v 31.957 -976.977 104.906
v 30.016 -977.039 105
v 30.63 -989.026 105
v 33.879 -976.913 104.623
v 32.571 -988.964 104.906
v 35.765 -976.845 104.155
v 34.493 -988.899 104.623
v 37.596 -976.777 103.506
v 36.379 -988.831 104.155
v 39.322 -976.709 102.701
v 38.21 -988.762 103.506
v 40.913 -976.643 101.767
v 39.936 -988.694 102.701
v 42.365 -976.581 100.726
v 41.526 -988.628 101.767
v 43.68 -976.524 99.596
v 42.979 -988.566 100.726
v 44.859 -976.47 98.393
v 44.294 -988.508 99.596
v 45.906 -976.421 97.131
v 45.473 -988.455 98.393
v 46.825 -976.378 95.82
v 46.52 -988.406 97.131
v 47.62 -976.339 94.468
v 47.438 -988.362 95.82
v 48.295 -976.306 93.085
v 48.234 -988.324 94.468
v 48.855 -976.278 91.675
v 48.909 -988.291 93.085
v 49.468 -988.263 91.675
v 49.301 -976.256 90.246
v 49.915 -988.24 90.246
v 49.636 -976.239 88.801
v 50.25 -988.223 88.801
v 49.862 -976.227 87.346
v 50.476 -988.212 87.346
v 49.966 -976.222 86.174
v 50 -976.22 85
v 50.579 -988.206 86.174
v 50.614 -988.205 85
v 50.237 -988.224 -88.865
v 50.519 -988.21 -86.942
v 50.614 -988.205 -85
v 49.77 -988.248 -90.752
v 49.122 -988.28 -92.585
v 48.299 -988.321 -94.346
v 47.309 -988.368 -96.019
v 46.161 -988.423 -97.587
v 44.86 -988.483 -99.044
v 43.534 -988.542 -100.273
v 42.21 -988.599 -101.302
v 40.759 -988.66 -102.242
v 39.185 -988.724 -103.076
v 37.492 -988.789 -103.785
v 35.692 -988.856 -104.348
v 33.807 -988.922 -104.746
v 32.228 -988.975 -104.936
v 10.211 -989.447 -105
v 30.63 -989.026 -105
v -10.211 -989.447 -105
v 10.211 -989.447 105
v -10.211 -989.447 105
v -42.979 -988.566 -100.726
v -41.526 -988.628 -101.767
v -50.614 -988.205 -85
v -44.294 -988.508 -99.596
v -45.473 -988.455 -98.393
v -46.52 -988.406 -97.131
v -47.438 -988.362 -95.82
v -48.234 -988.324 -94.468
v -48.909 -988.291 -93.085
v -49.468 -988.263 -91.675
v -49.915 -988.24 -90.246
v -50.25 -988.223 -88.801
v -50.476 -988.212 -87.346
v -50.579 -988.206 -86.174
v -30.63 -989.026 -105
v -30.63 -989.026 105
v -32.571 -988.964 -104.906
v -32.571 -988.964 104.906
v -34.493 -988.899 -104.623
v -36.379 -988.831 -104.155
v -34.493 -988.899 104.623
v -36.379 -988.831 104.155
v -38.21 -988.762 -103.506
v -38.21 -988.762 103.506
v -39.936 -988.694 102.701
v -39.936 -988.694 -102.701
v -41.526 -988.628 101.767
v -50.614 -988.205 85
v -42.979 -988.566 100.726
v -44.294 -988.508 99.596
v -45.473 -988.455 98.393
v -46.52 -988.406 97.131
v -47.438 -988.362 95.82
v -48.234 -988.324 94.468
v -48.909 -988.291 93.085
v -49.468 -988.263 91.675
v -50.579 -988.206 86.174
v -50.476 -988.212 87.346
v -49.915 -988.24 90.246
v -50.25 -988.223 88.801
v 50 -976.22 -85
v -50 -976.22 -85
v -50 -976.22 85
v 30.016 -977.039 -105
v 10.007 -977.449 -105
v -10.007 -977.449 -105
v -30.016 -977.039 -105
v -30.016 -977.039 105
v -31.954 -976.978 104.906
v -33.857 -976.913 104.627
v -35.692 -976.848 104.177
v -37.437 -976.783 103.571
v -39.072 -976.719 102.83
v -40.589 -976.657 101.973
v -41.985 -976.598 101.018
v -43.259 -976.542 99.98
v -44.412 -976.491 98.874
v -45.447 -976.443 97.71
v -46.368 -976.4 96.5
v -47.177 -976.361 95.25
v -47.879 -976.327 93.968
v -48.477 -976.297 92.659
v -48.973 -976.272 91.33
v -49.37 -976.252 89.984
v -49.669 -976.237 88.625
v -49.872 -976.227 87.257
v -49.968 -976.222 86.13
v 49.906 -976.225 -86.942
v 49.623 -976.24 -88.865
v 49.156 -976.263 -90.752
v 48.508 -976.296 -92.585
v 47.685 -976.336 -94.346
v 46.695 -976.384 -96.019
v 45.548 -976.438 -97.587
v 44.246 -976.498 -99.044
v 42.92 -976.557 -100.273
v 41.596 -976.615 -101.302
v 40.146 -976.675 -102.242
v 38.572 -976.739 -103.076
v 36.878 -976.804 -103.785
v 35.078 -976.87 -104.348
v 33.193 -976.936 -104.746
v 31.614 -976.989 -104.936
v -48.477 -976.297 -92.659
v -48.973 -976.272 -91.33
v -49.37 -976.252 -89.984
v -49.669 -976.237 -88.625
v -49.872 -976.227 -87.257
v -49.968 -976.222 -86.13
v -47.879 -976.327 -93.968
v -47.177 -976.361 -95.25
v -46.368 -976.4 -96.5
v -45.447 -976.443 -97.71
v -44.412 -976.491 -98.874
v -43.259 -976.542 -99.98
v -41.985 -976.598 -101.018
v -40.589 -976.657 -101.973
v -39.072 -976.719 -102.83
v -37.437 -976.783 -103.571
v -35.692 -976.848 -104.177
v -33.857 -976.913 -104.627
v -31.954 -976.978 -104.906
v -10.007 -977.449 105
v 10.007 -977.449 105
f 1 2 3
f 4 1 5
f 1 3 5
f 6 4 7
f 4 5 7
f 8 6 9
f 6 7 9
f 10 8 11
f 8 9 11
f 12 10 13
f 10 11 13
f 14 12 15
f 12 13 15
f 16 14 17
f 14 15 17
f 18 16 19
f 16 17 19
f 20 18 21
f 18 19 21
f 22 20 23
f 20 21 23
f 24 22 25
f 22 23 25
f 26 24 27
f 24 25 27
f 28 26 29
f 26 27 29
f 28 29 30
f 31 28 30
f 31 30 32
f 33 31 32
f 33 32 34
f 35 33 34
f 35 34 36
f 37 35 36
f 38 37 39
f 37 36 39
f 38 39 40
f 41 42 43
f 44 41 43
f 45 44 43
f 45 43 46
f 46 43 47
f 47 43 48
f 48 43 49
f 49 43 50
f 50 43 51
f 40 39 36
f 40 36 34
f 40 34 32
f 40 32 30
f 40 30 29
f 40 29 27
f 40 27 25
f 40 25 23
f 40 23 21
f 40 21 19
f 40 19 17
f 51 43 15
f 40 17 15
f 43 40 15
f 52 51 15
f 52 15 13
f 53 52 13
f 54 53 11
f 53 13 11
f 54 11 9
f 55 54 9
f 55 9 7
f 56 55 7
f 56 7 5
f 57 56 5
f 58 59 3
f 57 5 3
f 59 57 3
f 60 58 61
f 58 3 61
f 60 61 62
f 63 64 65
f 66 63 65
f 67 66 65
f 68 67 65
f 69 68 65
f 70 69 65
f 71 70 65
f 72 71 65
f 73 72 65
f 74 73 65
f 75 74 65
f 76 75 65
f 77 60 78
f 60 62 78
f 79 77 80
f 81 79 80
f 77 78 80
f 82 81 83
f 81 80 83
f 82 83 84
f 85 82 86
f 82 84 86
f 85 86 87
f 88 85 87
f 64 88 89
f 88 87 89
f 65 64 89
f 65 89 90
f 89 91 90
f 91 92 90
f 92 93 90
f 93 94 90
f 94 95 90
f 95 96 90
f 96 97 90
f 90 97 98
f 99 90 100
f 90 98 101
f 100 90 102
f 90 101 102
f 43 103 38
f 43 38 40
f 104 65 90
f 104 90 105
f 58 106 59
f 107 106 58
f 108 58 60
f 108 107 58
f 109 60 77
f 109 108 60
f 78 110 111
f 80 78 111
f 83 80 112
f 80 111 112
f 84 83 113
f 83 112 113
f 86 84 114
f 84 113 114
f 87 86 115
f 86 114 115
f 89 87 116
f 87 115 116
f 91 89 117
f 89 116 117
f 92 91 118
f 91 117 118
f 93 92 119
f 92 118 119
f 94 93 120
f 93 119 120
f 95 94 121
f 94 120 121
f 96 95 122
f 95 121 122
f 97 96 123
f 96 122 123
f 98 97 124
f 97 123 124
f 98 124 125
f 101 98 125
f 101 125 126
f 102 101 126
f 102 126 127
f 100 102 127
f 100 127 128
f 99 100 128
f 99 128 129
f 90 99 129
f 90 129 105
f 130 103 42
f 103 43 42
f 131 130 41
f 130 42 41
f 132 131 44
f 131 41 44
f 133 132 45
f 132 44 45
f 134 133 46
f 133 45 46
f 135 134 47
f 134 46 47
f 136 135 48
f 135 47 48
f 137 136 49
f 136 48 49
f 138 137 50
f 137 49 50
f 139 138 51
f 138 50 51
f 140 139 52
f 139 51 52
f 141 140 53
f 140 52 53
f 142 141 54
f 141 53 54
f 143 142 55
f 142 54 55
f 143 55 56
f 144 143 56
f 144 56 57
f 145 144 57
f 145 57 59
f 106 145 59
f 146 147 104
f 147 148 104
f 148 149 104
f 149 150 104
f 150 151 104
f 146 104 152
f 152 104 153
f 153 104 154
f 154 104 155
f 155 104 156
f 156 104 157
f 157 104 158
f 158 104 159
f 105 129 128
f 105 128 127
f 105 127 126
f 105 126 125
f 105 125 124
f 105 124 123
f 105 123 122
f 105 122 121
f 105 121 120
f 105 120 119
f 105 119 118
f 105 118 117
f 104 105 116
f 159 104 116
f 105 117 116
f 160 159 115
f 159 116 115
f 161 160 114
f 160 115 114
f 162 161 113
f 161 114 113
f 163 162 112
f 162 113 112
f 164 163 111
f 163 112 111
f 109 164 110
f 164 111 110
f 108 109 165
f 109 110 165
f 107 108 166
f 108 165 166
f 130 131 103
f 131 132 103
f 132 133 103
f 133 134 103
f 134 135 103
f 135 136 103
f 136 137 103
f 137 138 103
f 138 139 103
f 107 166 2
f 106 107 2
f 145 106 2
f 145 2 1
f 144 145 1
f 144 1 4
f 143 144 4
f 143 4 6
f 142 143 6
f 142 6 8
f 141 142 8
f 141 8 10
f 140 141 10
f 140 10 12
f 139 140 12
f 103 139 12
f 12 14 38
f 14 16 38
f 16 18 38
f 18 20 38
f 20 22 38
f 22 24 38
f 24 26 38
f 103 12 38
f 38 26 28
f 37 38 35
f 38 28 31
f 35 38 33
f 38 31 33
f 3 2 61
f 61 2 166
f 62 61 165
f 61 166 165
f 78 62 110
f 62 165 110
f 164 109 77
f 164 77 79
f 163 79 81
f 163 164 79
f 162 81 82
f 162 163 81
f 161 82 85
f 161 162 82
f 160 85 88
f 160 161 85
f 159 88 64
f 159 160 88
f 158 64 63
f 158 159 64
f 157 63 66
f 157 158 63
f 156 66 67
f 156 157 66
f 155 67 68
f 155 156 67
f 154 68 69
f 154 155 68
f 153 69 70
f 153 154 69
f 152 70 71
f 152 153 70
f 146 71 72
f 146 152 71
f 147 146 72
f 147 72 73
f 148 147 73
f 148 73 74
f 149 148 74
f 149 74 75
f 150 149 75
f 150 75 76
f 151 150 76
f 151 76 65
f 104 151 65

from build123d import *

# Parameters (mm, degrees)
SM_BASE_FLANGE_1_DEPTH = 105
FILLET_1_R             = 20


# Sheet-metal steps are written as plain solids
with BuildPart() as part:
    # Sketch 1 → 基体-法兰1 (new, symmetric)
    with BuildSketch(Plane.XY):
        with BuildLine():
            ThreePointArc((-50, -976.220390076), (0, -977.5), (50, -976.220390076))
            Line((50, -976.220390076), (50.613810742, -988.20468131))
            ThreePointArc((50.613810742, -988.20468131), (0, -989.5), (-50.613810742, -988.20468131))
            Line((-50.613810742, -988.20468131), (-50, -976.220390076))
        make_face()
    extrude(amount=SM_BASE_FLANGE_1_DEPTH, both=True)

    # 圆角1
    fillet_1_edges = [part.edges().sort_by_distance(p)[0] for p in [
        (-50.306905371, -982.212535693, 105),
        (-50.306905371, -982.212535693, -105),
        (50.306905371, -982.212535693, -105),
        (50.306905371, -982.212535693, 105),
    ]]
    fillet(fillet_1_edges, radius=FILLET_1_R)


solid = part.part
